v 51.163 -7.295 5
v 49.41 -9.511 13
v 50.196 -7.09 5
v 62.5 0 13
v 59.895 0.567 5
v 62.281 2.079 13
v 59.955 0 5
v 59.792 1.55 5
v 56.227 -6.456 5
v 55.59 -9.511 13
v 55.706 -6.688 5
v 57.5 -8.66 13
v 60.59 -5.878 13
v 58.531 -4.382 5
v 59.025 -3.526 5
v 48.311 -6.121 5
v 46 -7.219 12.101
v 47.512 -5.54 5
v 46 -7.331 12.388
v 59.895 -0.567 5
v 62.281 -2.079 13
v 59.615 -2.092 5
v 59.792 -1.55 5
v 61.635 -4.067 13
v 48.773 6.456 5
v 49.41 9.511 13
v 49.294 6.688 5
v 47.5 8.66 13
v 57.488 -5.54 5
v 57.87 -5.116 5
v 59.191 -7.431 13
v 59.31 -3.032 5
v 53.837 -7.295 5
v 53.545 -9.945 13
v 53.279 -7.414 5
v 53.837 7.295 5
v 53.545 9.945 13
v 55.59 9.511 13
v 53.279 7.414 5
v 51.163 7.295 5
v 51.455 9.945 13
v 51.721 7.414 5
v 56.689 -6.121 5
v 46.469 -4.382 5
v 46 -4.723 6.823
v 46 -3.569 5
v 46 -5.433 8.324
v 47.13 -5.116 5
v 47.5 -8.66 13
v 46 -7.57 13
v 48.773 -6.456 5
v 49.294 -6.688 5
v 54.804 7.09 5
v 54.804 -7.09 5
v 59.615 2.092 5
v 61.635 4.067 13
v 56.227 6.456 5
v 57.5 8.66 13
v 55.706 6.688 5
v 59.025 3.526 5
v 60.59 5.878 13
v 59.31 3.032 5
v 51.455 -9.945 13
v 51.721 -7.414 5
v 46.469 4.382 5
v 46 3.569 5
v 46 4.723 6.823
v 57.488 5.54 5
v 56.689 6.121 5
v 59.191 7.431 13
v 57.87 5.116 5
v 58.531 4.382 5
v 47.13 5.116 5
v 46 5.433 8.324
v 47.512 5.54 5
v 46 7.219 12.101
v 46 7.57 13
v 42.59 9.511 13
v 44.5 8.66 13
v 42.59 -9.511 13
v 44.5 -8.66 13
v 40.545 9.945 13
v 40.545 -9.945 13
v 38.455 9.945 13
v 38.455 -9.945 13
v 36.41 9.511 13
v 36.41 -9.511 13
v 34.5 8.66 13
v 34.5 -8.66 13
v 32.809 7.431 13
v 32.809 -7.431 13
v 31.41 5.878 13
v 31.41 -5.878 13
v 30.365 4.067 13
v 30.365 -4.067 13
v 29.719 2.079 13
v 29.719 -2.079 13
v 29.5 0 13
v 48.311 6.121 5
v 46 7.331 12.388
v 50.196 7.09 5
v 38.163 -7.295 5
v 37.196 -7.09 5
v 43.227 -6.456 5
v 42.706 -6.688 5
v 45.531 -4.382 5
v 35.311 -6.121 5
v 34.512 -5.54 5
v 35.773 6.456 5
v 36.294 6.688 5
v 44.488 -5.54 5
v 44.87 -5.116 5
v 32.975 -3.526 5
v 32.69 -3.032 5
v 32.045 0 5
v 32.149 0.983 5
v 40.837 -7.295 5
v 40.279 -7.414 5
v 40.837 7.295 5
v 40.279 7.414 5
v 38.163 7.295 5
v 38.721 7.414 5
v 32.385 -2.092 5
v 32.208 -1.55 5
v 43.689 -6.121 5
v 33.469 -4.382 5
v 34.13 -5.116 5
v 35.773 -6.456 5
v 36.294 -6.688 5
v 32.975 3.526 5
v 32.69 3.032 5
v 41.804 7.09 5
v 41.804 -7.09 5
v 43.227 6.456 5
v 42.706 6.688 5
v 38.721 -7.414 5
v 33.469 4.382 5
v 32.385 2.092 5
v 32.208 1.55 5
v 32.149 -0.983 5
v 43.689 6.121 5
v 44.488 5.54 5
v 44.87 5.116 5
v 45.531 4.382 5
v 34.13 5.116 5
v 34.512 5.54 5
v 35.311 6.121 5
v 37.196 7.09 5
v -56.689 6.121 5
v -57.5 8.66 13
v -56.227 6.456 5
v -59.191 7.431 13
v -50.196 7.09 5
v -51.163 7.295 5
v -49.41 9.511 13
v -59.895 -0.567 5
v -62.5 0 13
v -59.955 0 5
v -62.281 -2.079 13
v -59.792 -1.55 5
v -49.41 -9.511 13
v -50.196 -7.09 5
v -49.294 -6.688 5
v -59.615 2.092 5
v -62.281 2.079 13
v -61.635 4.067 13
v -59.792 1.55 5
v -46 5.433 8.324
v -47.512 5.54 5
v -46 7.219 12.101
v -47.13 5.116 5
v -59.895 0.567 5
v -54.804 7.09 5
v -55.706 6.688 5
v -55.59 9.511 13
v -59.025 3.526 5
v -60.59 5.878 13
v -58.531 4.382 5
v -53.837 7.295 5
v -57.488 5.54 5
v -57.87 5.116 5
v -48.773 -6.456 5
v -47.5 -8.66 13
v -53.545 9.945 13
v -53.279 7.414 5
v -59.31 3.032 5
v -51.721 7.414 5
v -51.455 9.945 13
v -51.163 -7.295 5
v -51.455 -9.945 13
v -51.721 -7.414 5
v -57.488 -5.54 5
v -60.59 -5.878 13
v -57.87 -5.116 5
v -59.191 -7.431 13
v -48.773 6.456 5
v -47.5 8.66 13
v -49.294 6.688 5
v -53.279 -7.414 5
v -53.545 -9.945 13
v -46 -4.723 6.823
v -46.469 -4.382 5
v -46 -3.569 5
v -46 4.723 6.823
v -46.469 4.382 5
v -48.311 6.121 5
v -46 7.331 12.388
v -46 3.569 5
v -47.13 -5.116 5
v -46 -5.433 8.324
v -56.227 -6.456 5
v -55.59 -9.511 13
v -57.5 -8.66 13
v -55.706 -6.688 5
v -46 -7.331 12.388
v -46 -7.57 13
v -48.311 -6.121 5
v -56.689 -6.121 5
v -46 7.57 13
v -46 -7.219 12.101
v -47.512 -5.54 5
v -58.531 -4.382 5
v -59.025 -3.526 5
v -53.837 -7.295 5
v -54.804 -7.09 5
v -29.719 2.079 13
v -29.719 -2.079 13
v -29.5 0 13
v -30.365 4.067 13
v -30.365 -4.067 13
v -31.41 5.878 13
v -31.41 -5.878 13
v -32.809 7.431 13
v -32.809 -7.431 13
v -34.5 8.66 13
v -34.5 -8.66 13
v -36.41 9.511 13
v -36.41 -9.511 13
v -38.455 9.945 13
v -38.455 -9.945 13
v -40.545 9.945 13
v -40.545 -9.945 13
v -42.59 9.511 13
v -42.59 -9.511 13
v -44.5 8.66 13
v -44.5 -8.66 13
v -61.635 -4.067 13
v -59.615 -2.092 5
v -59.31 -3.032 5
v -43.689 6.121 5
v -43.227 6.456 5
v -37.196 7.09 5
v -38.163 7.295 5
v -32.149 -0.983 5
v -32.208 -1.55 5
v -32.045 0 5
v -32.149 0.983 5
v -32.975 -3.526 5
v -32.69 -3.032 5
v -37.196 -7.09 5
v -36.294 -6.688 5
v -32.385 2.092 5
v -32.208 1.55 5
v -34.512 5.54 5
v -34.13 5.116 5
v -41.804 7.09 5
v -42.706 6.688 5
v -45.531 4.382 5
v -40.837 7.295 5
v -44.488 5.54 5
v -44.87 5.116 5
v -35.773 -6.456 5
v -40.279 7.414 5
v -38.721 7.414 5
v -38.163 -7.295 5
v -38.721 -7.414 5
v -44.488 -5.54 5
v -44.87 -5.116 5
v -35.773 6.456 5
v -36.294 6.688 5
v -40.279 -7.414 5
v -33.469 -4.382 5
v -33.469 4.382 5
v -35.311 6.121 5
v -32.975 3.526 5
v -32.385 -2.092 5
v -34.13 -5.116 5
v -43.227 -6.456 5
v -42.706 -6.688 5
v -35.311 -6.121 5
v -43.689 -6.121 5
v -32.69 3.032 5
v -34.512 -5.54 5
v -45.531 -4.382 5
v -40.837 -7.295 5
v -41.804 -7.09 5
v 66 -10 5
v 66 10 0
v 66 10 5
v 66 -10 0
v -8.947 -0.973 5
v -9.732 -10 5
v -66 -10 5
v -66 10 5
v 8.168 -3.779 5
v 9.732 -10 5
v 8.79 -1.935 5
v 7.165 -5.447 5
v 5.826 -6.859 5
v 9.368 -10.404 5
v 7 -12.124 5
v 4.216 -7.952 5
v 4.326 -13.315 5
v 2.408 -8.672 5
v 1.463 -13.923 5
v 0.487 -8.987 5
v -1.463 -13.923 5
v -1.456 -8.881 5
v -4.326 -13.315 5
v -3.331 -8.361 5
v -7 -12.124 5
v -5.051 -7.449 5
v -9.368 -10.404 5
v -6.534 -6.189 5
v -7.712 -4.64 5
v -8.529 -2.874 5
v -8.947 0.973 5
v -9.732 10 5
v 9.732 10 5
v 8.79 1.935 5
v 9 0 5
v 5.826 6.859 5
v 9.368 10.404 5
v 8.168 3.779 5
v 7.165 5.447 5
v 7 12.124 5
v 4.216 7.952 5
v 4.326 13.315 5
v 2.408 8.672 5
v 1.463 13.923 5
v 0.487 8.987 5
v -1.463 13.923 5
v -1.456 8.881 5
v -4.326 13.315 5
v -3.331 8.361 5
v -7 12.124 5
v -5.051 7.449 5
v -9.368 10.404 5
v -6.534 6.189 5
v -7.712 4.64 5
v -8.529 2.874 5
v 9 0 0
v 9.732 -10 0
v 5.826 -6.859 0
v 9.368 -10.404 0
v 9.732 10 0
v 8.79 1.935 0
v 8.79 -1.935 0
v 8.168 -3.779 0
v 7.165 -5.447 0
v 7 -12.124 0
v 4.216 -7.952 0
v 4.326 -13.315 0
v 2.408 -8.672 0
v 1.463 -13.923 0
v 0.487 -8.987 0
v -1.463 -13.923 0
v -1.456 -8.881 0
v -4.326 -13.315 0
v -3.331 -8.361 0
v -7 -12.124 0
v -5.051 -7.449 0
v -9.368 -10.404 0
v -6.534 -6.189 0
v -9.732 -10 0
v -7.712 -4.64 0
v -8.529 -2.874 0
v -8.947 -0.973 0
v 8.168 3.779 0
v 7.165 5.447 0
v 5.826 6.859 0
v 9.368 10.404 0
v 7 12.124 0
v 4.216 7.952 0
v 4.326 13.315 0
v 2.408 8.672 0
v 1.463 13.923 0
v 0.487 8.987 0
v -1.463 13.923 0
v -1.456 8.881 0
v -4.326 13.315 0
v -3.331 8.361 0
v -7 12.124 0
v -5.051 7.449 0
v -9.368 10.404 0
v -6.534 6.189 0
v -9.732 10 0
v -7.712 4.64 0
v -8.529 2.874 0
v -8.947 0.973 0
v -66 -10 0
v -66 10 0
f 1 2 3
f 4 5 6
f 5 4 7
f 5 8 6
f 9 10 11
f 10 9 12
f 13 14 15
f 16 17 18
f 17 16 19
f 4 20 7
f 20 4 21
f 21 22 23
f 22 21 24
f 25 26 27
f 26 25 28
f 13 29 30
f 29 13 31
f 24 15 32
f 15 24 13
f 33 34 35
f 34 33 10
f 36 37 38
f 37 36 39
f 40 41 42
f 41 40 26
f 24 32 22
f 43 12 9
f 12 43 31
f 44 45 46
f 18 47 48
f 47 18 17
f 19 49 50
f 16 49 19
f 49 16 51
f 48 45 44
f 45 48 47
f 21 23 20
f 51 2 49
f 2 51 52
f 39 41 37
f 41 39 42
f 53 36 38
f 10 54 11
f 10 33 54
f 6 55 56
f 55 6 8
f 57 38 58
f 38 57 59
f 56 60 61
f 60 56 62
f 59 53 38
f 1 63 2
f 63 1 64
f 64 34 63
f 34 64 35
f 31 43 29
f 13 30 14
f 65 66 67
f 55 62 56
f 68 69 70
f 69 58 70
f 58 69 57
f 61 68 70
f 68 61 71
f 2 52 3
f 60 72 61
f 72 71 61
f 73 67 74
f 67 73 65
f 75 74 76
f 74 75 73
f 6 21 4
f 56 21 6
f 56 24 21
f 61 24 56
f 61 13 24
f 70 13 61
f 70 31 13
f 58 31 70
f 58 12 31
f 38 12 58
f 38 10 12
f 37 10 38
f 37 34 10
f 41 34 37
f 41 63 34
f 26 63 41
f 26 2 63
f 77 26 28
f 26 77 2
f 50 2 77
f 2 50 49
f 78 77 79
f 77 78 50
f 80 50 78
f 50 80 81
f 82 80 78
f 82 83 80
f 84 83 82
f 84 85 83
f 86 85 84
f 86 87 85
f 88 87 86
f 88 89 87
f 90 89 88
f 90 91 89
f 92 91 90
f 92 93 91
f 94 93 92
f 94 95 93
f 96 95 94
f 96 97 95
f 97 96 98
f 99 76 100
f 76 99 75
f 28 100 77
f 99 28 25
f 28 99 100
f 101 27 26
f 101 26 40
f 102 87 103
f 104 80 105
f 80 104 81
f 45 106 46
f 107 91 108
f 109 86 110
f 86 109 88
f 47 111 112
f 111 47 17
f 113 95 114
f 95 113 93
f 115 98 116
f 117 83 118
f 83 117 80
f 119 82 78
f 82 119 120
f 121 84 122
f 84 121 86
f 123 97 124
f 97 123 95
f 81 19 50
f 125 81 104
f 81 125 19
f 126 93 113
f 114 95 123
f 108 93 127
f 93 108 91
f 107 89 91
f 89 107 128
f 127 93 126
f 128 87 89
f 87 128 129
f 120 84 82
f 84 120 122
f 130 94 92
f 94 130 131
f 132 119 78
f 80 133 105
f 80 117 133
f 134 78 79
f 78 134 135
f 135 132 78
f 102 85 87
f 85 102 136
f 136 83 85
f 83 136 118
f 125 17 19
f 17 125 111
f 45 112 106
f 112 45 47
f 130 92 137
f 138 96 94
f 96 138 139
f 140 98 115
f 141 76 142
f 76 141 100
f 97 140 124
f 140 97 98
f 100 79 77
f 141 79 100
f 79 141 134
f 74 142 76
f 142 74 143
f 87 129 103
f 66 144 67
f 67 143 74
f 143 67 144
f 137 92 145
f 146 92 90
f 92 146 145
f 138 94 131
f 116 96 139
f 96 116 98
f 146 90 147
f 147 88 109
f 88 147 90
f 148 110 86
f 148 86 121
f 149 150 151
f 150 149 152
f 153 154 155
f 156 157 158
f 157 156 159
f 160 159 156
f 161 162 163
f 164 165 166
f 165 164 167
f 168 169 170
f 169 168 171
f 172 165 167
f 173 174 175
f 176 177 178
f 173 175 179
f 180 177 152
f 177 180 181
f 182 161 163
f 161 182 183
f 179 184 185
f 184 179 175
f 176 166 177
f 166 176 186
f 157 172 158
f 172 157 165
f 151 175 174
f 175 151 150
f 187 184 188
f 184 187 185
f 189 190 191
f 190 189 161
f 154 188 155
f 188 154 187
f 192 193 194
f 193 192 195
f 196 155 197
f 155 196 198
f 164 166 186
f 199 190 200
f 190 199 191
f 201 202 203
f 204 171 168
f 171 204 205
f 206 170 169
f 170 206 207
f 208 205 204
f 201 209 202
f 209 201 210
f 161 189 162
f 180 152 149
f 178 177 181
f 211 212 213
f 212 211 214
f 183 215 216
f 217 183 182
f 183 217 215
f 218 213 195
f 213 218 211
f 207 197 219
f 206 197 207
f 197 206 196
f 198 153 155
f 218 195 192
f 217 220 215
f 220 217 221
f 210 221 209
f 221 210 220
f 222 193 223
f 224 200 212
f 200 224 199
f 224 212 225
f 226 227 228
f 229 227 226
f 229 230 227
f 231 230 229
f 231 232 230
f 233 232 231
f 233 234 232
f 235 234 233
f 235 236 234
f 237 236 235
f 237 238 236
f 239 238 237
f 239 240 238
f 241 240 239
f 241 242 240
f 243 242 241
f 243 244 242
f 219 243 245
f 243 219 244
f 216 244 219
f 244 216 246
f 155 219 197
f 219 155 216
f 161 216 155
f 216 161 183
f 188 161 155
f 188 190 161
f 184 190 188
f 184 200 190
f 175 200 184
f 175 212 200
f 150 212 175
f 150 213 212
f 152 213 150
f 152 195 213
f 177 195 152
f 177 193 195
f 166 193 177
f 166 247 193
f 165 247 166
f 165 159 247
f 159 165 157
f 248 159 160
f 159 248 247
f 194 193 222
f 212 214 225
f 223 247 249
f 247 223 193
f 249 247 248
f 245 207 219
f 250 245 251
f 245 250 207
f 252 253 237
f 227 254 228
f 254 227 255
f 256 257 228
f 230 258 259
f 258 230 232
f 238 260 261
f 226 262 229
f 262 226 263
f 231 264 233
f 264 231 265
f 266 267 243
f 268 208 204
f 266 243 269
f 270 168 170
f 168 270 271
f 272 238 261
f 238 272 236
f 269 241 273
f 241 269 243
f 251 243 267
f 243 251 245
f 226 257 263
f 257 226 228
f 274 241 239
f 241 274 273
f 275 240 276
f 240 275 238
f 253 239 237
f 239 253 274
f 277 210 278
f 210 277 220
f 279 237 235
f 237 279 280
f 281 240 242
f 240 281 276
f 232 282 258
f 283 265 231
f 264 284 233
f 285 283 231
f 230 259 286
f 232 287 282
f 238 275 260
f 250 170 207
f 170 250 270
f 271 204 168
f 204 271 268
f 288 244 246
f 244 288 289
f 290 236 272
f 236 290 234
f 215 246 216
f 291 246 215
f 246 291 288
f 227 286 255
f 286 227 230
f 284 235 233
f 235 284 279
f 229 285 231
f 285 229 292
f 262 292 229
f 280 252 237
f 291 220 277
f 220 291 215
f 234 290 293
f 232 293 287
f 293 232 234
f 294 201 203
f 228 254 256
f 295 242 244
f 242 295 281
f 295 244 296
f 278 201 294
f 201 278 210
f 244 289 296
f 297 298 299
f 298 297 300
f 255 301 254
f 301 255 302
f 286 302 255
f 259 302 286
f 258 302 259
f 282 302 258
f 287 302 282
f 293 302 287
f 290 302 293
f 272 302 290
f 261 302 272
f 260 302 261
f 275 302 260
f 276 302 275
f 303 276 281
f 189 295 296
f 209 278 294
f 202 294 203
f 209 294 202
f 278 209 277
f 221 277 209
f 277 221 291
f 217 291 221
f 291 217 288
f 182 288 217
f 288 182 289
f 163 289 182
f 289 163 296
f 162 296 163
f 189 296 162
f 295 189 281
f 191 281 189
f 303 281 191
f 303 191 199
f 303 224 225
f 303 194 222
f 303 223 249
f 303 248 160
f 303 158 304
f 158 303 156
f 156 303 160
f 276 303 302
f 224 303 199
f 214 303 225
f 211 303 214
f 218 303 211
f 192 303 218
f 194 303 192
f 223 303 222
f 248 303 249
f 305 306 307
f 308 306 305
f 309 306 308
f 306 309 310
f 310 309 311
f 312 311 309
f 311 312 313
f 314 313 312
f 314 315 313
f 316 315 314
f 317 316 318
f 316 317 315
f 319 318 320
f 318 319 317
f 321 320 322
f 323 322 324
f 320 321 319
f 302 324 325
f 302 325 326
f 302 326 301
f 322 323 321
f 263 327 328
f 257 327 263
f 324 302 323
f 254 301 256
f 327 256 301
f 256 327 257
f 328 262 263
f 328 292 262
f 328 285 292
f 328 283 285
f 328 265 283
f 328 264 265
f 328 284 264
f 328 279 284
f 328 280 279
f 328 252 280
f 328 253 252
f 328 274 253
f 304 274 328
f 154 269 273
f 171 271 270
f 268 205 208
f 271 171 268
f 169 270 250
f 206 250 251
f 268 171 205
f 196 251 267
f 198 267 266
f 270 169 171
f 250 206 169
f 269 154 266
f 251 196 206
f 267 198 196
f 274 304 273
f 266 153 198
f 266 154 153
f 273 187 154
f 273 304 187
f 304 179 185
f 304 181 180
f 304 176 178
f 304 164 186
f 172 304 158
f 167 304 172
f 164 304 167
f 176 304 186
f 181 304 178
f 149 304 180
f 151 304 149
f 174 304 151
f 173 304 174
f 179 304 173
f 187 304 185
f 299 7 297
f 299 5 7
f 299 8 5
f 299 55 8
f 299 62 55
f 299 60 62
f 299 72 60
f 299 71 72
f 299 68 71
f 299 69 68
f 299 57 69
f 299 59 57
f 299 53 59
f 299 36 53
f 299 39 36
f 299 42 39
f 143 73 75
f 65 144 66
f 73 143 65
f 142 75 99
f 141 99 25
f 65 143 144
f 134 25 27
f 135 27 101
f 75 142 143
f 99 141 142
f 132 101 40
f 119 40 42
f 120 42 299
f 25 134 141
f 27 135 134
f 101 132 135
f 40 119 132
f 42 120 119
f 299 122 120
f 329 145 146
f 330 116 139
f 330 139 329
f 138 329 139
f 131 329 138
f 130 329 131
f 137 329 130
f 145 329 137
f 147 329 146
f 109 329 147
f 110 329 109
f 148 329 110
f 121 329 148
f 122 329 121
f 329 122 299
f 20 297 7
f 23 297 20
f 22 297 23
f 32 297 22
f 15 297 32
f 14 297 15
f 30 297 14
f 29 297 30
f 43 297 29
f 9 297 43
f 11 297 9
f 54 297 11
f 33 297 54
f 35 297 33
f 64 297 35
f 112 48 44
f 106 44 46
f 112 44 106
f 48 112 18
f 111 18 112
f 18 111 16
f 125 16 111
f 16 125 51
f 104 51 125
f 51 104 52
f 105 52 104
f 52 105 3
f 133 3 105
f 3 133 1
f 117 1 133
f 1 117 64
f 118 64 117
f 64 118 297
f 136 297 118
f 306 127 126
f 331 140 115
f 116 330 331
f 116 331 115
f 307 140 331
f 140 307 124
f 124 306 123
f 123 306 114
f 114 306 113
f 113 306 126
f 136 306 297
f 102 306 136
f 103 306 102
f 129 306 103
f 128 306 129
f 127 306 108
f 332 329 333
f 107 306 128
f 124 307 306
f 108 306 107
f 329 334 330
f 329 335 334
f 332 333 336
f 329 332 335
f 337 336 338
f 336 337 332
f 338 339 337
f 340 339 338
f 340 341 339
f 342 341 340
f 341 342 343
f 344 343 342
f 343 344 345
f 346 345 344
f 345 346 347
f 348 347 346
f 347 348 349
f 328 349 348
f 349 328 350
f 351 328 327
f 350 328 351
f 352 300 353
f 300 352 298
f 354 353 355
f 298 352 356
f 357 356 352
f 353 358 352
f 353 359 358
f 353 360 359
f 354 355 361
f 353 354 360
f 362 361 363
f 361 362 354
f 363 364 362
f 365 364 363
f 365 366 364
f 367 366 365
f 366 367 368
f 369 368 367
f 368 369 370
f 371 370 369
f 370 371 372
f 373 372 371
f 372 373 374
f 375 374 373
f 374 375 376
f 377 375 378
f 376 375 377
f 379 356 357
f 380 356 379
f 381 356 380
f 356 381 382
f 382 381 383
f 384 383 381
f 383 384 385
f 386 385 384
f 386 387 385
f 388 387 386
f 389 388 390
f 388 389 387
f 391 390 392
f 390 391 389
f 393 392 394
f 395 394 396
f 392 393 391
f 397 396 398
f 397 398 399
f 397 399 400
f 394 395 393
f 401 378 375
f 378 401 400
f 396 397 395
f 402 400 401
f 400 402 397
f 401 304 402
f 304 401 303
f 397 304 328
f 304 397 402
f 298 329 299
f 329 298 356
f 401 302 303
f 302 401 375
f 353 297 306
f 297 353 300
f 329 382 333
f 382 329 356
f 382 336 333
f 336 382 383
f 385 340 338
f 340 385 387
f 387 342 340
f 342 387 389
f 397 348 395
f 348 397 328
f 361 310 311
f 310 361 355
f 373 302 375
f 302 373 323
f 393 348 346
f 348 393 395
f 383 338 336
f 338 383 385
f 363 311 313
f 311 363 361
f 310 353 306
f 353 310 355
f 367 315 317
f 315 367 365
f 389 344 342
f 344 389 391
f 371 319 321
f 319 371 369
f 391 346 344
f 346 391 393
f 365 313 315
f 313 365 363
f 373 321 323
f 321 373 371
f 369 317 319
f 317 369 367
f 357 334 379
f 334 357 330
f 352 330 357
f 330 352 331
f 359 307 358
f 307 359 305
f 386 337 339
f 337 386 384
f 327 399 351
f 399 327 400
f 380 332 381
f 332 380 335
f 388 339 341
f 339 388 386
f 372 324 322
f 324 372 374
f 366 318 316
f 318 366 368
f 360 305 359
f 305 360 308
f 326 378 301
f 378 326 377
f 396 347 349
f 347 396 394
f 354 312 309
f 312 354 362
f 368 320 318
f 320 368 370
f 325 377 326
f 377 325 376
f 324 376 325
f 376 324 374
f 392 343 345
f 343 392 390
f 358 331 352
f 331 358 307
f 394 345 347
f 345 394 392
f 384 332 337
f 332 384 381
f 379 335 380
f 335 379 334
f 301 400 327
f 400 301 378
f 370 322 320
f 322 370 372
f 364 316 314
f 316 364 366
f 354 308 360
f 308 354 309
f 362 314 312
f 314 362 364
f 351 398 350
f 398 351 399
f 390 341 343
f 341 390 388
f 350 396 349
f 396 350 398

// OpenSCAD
%cube([40,60,80]);
s1=1.5;

	
difference(){
		union(){
			translate([-s1*44,-10,0]) cube([s1*88,20,5]); 
			cylinder(5,14,14); 		
			for(i=[0:1]){
			rotate([0,0,i*180]) translate([s1*35,0,2]) cylinder(11,6.5,10);
			rotate([0,0,i*180]) translate([s1*35-13,0,2]) cylinder(11,6.5,10);
			}
}

cylinder(150,9,9);

}
		

	
